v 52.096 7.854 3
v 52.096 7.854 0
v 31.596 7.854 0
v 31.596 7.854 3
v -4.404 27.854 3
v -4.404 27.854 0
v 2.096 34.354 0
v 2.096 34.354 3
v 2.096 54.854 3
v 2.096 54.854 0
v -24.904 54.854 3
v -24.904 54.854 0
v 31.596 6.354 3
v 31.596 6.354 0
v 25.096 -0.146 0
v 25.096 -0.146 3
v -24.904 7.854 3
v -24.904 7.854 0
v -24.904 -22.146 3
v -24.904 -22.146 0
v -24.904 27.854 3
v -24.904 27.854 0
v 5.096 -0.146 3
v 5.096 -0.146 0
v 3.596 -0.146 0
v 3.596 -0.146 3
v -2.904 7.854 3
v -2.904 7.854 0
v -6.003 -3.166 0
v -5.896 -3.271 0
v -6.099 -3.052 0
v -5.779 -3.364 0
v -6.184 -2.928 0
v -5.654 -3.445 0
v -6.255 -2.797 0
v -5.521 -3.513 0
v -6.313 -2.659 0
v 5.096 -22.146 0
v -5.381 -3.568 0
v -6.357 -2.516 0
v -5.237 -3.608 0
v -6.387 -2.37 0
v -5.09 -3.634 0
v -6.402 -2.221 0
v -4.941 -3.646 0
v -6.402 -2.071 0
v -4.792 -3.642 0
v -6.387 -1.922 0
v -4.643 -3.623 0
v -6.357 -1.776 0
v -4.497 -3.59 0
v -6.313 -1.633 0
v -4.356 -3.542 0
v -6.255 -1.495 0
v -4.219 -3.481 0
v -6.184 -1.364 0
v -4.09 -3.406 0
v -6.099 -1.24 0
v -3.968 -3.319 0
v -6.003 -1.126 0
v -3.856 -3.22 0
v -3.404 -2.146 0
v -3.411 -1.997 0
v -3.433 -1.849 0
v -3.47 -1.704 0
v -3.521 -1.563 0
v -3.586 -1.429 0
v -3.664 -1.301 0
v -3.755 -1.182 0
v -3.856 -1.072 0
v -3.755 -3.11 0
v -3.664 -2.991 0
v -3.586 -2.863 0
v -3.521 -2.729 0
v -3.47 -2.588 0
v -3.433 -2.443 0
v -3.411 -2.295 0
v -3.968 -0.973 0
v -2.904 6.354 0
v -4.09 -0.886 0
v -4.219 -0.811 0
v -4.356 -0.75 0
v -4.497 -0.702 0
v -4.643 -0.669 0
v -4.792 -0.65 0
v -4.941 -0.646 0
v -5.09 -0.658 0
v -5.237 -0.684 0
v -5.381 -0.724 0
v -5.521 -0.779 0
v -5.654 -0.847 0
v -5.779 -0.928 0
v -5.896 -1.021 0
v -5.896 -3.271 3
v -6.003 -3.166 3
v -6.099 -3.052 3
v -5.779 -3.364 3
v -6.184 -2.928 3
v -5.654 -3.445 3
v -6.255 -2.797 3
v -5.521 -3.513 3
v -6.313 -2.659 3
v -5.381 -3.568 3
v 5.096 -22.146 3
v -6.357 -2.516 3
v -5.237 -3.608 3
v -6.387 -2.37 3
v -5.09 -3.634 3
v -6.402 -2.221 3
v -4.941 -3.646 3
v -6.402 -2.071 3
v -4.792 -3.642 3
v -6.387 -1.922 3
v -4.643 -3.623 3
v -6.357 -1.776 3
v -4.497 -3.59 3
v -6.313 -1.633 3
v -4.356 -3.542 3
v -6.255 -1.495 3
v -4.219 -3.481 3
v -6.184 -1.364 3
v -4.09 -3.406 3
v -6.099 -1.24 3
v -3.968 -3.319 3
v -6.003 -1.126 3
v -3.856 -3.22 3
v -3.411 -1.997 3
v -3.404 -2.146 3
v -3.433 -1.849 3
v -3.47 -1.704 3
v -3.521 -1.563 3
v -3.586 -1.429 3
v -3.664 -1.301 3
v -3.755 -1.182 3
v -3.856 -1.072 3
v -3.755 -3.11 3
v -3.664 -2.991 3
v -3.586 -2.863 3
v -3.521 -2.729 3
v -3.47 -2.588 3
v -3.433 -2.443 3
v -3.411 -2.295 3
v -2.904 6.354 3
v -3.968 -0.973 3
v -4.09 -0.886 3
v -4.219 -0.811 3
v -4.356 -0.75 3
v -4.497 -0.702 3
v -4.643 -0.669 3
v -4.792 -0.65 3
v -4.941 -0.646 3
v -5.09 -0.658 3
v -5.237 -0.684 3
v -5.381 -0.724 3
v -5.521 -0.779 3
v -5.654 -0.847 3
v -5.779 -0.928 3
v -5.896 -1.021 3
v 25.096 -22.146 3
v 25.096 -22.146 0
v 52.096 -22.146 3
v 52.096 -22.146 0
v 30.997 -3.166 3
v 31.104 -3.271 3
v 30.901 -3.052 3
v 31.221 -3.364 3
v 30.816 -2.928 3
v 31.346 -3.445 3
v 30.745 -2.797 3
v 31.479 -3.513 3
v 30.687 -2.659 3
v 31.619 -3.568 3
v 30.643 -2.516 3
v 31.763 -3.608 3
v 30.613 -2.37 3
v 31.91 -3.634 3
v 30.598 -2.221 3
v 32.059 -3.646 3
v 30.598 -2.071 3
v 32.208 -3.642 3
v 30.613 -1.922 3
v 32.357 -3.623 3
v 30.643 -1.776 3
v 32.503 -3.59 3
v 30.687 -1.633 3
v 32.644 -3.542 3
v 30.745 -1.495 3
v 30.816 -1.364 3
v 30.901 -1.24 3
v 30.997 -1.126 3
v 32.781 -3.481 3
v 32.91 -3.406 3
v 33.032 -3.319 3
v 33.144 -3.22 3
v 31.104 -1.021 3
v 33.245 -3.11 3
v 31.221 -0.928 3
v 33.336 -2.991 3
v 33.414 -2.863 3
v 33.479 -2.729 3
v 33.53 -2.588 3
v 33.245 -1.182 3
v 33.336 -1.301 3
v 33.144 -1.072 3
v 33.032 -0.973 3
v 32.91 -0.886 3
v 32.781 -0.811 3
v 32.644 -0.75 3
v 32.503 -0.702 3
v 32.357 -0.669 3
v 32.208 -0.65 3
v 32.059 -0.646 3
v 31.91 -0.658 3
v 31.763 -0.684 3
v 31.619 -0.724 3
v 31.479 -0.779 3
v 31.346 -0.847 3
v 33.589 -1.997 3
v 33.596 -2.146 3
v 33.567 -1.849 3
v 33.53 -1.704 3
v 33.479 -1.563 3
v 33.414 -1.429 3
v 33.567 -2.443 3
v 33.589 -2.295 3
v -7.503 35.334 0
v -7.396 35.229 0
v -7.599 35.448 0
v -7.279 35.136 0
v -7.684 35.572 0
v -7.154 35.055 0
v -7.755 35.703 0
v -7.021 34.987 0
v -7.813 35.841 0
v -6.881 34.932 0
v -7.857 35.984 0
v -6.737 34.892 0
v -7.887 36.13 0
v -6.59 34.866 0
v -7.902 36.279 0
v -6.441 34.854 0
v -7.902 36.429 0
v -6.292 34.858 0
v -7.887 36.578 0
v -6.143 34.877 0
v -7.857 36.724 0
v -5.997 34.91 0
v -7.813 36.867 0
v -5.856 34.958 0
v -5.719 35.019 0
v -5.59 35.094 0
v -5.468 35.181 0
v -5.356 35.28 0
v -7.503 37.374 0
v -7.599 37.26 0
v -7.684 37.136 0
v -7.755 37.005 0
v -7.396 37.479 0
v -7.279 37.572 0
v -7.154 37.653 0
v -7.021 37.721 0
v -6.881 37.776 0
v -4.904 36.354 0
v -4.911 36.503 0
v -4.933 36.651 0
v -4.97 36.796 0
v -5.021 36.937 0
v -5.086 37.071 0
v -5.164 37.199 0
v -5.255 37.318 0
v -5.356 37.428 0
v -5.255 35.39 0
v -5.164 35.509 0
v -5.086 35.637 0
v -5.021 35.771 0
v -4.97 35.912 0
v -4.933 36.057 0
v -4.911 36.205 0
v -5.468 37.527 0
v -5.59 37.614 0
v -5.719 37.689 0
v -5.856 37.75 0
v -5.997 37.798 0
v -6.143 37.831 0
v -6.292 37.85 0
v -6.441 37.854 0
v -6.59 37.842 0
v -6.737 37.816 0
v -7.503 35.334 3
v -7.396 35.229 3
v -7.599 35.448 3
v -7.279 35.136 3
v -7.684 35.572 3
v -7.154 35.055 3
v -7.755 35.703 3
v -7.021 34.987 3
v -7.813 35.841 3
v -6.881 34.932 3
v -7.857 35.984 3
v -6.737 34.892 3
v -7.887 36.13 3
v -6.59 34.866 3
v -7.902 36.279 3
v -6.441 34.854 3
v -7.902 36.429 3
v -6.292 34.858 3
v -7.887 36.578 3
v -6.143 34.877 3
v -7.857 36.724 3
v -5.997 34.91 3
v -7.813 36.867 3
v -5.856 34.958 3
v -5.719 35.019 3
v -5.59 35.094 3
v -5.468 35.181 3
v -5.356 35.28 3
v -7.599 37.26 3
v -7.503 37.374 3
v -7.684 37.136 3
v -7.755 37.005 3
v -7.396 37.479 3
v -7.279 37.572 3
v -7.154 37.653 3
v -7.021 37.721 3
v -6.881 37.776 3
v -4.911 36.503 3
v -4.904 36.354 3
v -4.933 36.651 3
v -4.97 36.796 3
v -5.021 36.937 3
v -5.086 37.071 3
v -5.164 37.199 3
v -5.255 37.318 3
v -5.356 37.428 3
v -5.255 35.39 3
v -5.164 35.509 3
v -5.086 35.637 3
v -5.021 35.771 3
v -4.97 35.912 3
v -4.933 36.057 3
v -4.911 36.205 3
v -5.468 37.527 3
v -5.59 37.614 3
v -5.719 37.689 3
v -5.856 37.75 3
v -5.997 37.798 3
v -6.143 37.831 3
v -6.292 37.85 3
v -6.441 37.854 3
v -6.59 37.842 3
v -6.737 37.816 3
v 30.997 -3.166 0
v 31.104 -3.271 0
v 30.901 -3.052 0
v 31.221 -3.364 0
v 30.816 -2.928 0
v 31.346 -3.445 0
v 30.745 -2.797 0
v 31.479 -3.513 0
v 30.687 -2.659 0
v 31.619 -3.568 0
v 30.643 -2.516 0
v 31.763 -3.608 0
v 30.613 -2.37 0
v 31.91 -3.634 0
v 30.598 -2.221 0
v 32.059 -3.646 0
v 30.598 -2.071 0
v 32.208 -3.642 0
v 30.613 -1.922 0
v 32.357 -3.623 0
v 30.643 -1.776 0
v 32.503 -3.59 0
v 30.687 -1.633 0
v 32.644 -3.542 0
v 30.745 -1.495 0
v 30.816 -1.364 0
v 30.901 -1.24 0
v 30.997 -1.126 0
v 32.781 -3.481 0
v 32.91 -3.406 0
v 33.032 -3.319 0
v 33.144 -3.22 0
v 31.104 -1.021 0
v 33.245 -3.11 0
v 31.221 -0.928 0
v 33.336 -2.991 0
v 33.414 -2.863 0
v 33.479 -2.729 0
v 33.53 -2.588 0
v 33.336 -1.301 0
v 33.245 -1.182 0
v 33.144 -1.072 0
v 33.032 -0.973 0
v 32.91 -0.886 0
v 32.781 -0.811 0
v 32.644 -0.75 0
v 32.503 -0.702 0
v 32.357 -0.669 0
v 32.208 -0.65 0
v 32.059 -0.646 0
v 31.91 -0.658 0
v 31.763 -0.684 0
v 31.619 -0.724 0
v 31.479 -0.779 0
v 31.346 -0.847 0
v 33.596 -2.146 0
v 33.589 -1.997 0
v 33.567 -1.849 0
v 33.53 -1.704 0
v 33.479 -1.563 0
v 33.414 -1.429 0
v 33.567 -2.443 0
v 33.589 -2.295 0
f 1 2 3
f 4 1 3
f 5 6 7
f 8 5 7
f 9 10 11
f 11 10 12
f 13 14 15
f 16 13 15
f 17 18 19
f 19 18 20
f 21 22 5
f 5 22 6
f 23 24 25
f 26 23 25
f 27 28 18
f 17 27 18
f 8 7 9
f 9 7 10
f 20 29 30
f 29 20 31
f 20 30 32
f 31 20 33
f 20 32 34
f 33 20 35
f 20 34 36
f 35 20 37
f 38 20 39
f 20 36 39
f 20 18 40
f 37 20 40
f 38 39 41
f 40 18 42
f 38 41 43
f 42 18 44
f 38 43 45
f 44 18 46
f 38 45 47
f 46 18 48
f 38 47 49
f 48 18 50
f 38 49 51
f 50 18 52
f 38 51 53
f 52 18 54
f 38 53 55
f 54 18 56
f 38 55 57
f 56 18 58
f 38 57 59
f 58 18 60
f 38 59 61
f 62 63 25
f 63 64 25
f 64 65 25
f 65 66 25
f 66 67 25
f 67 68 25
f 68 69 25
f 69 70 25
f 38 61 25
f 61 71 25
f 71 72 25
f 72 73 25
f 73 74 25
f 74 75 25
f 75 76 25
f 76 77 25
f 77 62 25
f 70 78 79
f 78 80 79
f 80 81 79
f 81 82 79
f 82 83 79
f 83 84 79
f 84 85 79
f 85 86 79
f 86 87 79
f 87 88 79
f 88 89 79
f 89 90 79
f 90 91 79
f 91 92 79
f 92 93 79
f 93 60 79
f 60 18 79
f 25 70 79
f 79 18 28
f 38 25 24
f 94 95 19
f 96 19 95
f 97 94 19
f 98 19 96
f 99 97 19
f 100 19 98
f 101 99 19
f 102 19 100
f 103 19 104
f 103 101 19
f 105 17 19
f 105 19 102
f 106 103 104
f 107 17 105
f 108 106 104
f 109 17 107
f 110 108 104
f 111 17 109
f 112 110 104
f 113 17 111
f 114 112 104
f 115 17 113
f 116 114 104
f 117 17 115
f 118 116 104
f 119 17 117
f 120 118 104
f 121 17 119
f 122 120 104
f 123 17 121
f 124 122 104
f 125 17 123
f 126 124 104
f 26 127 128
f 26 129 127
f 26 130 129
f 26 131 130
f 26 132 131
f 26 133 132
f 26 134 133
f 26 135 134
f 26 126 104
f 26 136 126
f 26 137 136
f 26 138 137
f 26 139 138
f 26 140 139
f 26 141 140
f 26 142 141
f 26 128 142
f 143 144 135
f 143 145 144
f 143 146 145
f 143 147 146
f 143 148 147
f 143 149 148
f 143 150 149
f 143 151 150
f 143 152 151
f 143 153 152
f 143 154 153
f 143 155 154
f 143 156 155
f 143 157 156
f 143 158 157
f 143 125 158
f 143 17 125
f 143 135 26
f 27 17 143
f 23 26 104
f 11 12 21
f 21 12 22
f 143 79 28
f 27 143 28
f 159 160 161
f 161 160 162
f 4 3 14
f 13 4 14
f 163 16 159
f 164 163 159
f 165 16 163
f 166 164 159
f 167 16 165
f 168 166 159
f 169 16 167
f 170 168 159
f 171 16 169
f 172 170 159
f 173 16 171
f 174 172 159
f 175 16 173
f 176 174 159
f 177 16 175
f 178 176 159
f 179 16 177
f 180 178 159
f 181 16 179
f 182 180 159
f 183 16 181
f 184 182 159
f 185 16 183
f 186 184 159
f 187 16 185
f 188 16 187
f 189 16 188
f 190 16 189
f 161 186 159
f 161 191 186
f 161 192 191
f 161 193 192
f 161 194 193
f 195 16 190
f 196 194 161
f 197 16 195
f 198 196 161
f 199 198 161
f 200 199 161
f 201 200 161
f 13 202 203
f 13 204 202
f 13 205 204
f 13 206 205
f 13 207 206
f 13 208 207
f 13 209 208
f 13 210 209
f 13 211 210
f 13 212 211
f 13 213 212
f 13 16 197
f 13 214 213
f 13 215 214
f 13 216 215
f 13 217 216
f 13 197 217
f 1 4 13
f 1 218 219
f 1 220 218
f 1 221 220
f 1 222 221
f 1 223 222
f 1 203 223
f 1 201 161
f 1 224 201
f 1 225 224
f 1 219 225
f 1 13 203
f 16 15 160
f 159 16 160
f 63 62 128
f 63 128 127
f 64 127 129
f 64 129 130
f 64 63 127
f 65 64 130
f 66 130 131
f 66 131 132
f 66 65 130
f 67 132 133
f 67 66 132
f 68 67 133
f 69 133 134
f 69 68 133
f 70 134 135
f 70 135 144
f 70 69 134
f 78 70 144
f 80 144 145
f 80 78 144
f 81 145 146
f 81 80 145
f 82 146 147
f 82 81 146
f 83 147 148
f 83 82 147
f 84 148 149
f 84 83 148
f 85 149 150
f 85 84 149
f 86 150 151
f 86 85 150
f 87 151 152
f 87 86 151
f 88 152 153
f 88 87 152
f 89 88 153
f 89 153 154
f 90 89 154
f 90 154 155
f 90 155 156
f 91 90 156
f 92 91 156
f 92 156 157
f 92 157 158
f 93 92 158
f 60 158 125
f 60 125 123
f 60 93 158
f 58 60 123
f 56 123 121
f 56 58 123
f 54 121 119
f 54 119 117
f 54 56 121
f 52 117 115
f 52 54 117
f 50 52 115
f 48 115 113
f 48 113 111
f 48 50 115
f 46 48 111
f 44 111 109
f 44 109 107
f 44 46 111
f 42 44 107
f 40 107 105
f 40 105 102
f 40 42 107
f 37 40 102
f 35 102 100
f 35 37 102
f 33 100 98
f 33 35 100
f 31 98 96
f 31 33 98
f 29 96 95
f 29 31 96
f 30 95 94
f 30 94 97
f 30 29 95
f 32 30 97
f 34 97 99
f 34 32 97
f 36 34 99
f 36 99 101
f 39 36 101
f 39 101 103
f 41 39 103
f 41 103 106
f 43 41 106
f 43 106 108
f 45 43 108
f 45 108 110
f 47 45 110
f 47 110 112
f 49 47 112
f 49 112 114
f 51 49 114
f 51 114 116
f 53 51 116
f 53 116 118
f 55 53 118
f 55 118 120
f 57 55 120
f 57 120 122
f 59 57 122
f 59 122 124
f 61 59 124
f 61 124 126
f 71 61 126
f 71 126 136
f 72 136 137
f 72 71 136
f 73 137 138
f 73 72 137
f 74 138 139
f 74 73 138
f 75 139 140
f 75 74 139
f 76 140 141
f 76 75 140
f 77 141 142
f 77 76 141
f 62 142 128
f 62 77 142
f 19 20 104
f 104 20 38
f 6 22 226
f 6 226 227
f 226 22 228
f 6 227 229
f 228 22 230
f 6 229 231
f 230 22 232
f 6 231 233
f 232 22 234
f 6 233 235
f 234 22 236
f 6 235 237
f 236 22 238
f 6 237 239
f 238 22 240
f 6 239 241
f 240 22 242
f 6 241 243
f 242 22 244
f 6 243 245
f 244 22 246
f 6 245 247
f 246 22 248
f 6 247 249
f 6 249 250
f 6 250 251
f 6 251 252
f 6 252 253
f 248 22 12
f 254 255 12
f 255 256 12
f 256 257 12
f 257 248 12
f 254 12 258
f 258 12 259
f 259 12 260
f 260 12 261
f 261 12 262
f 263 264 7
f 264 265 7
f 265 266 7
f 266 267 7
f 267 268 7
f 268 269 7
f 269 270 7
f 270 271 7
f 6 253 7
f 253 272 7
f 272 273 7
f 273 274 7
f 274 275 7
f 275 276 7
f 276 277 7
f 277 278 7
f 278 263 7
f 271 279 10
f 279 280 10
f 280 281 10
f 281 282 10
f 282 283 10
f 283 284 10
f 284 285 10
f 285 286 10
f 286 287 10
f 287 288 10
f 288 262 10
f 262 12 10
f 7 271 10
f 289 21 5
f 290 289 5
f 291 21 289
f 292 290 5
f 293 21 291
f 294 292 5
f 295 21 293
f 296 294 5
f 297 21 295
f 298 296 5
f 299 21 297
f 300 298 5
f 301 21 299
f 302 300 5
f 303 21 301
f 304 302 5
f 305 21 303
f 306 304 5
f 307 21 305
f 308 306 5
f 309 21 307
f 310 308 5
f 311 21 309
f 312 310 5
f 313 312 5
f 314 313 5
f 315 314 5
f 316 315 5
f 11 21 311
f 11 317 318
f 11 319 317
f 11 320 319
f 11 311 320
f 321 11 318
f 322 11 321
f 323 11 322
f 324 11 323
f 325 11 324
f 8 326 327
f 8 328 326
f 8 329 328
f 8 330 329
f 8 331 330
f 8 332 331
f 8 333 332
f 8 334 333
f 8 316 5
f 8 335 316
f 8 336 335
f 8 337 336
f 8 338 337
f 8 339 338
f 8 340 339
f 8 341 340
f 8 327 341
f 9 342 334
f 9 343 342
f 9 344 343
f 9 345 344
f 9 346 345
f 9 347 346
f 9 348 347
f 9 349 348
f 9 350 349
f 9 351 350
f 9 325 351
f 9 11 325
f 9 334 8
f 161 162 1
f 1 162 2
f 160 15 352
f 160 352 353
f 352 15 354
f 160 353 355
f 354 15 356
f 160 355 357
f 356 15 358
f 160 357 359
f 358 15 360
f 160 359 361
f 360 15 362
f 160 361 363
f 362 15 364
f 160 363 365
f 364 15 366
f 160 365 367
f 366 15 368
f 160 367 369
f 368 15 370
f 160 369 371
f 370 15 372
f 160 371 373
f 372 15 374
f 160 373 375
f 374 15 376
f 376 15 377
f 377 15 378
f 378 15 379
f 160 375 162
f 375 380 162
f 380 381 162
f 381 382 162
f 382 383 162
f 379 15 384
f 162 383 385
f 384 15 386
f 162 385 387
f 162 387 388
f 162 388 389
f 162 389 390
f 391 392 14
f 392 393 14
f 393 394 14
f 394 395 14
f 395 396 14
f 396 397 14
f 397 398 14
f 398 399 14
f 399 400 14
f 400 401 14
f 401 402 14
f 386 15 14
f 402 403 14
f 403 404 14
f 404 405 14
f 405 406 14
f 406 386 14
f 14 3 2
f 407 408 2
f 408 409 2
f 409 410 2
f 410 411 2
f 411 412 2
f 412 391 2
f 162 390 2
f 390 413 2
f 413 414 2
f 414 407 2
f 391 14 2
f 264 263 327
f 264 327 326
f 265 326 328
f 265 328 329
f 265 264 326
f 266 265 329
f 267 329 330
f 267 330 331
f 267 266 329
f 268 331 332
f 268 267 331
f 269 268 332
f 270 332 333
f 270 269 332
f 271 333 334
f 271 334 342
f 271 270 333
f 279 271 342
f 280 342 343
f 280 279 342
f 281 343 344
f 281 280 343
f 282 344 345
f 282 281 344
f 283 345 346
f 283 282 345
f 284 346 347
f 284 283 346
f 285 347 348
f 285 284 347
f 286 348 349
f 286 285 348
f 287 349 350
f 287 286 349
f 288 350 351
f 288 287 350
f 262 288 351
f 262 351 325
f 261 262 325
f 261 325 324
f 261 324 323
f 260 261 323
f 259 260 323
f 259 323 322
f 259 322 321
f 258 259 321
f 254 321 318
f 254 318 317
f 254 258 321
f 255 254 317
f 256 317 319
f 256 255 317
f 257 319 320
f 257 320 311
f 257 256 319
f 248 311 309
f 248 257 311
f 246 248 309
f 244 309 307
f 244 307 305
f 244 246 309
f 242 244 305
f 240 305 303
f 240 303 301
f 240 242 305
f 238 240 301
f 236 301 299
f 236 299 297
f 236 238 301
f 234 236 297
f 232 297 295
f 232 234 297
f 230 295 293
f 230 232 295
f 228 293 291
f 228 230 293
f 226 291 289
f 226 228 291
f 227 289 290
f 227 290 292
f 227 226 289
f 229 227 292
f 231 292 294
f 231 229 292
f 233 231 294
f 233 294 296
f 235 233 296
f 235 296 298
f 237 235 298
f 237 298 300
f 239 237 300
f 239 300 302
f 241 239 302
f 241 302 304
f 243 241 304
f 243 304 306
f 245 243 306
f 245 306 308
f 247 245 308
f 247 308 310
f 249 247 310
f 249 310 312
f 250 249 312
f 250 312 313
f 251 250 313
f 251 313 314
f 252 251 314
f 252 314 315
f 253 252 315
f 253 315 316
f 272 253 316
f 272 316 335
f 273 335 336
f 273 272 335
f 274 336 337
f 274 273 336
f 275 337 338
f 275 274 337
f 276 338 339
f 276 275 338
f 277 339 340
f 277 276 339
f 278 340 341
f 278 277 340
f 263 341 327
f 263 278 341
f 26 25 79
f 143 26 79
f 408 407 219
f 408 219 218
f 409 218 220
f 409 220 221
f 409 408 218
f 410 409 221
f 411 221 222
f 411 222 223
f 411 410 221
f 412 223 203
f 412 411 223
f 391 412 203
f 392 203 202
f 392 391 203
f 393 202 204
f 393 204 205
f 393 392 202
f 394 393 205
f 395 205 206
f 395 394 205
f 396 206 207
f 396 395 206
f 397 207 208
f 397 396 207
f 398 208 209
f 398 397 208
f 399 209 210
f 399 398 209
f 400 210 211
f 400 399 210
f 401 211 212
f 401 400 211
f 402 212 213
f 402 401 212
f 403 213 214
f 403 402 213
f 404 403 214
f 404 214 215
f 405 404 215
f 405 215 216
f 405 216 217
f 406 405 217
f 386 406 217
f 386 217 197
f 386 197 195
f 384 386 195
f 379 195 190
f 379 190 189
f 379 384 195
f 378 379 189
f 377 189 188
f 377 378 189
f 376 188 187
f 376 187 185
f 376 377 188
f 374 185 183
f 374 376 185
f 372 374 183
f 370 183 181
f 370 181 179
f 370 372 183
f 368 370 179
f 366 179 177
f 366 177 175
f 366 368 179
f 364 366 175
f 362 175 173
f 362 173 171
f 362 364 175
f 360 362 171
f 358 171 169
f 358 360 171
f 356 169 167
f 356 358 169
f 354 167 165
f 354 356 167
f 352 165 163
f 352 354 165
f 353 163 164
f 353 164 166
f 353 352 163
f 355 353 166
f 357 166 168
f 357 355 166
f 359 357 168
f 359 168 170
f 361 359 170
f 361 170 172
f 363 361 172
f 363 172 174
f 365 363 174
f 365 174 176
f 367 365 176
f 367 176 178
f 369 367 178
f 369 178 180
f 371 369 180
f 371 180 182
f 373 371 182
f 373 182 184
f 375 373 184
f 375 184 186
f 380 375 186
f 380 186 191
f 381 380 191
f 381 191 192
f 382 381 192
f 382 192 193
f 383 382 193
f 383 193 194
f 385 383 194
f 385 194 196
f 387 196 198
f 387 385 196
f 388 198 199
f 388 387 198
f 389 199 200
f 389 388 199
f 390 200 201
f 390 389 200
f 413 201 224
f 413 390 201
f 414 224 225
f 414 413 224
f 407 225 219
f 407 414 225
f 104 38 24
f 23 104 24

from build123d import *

# Parameters (mm, degrees)
F0_R     = 1.5
F1_DEPTH = 3


with BuildPart() as f1:
    # F0 (on Top) → F1 (new body)
    with BuildSketch(Plane.XY):
        Polygon((-2.903625, 7.854014), (-24.903625, 7.854014), (-24.903625, -22.145986), (5.096375, -22.145986), (5.096375, -0.145986), (3.596375, -0.145986), (-2.903625, 6.354014), align=None)
        with Locations((-4.903625, -2.145986)):
            Circle(F0_R, mode=Mode.SUBTRACT)
        Polygon((52.096375, 7.854014), (31.596375, 7.854014), (31.596375, 6.354014), (25.096375, -0.145986), (25.096375, -22.145986), (52.096375, -22.145986), align=None)
        with Locations((32.096375, -2.145986)):
            Circle(F0_R, mode=Mode.SUBTRACT)
        Polygon((2.096375, 54.854014), (-24.903625, 54.854014), (-24.903625, 27.854014), (-4.403625, 27.854014), (2.096375, 34.354014), align=None)
        with Locations((-6.403625, 36.354014)):
            Circle(F0_R, mode=Mode.SUBTRACT)
    extrude(amount=F1_DEPTH)


solid = f1.part
